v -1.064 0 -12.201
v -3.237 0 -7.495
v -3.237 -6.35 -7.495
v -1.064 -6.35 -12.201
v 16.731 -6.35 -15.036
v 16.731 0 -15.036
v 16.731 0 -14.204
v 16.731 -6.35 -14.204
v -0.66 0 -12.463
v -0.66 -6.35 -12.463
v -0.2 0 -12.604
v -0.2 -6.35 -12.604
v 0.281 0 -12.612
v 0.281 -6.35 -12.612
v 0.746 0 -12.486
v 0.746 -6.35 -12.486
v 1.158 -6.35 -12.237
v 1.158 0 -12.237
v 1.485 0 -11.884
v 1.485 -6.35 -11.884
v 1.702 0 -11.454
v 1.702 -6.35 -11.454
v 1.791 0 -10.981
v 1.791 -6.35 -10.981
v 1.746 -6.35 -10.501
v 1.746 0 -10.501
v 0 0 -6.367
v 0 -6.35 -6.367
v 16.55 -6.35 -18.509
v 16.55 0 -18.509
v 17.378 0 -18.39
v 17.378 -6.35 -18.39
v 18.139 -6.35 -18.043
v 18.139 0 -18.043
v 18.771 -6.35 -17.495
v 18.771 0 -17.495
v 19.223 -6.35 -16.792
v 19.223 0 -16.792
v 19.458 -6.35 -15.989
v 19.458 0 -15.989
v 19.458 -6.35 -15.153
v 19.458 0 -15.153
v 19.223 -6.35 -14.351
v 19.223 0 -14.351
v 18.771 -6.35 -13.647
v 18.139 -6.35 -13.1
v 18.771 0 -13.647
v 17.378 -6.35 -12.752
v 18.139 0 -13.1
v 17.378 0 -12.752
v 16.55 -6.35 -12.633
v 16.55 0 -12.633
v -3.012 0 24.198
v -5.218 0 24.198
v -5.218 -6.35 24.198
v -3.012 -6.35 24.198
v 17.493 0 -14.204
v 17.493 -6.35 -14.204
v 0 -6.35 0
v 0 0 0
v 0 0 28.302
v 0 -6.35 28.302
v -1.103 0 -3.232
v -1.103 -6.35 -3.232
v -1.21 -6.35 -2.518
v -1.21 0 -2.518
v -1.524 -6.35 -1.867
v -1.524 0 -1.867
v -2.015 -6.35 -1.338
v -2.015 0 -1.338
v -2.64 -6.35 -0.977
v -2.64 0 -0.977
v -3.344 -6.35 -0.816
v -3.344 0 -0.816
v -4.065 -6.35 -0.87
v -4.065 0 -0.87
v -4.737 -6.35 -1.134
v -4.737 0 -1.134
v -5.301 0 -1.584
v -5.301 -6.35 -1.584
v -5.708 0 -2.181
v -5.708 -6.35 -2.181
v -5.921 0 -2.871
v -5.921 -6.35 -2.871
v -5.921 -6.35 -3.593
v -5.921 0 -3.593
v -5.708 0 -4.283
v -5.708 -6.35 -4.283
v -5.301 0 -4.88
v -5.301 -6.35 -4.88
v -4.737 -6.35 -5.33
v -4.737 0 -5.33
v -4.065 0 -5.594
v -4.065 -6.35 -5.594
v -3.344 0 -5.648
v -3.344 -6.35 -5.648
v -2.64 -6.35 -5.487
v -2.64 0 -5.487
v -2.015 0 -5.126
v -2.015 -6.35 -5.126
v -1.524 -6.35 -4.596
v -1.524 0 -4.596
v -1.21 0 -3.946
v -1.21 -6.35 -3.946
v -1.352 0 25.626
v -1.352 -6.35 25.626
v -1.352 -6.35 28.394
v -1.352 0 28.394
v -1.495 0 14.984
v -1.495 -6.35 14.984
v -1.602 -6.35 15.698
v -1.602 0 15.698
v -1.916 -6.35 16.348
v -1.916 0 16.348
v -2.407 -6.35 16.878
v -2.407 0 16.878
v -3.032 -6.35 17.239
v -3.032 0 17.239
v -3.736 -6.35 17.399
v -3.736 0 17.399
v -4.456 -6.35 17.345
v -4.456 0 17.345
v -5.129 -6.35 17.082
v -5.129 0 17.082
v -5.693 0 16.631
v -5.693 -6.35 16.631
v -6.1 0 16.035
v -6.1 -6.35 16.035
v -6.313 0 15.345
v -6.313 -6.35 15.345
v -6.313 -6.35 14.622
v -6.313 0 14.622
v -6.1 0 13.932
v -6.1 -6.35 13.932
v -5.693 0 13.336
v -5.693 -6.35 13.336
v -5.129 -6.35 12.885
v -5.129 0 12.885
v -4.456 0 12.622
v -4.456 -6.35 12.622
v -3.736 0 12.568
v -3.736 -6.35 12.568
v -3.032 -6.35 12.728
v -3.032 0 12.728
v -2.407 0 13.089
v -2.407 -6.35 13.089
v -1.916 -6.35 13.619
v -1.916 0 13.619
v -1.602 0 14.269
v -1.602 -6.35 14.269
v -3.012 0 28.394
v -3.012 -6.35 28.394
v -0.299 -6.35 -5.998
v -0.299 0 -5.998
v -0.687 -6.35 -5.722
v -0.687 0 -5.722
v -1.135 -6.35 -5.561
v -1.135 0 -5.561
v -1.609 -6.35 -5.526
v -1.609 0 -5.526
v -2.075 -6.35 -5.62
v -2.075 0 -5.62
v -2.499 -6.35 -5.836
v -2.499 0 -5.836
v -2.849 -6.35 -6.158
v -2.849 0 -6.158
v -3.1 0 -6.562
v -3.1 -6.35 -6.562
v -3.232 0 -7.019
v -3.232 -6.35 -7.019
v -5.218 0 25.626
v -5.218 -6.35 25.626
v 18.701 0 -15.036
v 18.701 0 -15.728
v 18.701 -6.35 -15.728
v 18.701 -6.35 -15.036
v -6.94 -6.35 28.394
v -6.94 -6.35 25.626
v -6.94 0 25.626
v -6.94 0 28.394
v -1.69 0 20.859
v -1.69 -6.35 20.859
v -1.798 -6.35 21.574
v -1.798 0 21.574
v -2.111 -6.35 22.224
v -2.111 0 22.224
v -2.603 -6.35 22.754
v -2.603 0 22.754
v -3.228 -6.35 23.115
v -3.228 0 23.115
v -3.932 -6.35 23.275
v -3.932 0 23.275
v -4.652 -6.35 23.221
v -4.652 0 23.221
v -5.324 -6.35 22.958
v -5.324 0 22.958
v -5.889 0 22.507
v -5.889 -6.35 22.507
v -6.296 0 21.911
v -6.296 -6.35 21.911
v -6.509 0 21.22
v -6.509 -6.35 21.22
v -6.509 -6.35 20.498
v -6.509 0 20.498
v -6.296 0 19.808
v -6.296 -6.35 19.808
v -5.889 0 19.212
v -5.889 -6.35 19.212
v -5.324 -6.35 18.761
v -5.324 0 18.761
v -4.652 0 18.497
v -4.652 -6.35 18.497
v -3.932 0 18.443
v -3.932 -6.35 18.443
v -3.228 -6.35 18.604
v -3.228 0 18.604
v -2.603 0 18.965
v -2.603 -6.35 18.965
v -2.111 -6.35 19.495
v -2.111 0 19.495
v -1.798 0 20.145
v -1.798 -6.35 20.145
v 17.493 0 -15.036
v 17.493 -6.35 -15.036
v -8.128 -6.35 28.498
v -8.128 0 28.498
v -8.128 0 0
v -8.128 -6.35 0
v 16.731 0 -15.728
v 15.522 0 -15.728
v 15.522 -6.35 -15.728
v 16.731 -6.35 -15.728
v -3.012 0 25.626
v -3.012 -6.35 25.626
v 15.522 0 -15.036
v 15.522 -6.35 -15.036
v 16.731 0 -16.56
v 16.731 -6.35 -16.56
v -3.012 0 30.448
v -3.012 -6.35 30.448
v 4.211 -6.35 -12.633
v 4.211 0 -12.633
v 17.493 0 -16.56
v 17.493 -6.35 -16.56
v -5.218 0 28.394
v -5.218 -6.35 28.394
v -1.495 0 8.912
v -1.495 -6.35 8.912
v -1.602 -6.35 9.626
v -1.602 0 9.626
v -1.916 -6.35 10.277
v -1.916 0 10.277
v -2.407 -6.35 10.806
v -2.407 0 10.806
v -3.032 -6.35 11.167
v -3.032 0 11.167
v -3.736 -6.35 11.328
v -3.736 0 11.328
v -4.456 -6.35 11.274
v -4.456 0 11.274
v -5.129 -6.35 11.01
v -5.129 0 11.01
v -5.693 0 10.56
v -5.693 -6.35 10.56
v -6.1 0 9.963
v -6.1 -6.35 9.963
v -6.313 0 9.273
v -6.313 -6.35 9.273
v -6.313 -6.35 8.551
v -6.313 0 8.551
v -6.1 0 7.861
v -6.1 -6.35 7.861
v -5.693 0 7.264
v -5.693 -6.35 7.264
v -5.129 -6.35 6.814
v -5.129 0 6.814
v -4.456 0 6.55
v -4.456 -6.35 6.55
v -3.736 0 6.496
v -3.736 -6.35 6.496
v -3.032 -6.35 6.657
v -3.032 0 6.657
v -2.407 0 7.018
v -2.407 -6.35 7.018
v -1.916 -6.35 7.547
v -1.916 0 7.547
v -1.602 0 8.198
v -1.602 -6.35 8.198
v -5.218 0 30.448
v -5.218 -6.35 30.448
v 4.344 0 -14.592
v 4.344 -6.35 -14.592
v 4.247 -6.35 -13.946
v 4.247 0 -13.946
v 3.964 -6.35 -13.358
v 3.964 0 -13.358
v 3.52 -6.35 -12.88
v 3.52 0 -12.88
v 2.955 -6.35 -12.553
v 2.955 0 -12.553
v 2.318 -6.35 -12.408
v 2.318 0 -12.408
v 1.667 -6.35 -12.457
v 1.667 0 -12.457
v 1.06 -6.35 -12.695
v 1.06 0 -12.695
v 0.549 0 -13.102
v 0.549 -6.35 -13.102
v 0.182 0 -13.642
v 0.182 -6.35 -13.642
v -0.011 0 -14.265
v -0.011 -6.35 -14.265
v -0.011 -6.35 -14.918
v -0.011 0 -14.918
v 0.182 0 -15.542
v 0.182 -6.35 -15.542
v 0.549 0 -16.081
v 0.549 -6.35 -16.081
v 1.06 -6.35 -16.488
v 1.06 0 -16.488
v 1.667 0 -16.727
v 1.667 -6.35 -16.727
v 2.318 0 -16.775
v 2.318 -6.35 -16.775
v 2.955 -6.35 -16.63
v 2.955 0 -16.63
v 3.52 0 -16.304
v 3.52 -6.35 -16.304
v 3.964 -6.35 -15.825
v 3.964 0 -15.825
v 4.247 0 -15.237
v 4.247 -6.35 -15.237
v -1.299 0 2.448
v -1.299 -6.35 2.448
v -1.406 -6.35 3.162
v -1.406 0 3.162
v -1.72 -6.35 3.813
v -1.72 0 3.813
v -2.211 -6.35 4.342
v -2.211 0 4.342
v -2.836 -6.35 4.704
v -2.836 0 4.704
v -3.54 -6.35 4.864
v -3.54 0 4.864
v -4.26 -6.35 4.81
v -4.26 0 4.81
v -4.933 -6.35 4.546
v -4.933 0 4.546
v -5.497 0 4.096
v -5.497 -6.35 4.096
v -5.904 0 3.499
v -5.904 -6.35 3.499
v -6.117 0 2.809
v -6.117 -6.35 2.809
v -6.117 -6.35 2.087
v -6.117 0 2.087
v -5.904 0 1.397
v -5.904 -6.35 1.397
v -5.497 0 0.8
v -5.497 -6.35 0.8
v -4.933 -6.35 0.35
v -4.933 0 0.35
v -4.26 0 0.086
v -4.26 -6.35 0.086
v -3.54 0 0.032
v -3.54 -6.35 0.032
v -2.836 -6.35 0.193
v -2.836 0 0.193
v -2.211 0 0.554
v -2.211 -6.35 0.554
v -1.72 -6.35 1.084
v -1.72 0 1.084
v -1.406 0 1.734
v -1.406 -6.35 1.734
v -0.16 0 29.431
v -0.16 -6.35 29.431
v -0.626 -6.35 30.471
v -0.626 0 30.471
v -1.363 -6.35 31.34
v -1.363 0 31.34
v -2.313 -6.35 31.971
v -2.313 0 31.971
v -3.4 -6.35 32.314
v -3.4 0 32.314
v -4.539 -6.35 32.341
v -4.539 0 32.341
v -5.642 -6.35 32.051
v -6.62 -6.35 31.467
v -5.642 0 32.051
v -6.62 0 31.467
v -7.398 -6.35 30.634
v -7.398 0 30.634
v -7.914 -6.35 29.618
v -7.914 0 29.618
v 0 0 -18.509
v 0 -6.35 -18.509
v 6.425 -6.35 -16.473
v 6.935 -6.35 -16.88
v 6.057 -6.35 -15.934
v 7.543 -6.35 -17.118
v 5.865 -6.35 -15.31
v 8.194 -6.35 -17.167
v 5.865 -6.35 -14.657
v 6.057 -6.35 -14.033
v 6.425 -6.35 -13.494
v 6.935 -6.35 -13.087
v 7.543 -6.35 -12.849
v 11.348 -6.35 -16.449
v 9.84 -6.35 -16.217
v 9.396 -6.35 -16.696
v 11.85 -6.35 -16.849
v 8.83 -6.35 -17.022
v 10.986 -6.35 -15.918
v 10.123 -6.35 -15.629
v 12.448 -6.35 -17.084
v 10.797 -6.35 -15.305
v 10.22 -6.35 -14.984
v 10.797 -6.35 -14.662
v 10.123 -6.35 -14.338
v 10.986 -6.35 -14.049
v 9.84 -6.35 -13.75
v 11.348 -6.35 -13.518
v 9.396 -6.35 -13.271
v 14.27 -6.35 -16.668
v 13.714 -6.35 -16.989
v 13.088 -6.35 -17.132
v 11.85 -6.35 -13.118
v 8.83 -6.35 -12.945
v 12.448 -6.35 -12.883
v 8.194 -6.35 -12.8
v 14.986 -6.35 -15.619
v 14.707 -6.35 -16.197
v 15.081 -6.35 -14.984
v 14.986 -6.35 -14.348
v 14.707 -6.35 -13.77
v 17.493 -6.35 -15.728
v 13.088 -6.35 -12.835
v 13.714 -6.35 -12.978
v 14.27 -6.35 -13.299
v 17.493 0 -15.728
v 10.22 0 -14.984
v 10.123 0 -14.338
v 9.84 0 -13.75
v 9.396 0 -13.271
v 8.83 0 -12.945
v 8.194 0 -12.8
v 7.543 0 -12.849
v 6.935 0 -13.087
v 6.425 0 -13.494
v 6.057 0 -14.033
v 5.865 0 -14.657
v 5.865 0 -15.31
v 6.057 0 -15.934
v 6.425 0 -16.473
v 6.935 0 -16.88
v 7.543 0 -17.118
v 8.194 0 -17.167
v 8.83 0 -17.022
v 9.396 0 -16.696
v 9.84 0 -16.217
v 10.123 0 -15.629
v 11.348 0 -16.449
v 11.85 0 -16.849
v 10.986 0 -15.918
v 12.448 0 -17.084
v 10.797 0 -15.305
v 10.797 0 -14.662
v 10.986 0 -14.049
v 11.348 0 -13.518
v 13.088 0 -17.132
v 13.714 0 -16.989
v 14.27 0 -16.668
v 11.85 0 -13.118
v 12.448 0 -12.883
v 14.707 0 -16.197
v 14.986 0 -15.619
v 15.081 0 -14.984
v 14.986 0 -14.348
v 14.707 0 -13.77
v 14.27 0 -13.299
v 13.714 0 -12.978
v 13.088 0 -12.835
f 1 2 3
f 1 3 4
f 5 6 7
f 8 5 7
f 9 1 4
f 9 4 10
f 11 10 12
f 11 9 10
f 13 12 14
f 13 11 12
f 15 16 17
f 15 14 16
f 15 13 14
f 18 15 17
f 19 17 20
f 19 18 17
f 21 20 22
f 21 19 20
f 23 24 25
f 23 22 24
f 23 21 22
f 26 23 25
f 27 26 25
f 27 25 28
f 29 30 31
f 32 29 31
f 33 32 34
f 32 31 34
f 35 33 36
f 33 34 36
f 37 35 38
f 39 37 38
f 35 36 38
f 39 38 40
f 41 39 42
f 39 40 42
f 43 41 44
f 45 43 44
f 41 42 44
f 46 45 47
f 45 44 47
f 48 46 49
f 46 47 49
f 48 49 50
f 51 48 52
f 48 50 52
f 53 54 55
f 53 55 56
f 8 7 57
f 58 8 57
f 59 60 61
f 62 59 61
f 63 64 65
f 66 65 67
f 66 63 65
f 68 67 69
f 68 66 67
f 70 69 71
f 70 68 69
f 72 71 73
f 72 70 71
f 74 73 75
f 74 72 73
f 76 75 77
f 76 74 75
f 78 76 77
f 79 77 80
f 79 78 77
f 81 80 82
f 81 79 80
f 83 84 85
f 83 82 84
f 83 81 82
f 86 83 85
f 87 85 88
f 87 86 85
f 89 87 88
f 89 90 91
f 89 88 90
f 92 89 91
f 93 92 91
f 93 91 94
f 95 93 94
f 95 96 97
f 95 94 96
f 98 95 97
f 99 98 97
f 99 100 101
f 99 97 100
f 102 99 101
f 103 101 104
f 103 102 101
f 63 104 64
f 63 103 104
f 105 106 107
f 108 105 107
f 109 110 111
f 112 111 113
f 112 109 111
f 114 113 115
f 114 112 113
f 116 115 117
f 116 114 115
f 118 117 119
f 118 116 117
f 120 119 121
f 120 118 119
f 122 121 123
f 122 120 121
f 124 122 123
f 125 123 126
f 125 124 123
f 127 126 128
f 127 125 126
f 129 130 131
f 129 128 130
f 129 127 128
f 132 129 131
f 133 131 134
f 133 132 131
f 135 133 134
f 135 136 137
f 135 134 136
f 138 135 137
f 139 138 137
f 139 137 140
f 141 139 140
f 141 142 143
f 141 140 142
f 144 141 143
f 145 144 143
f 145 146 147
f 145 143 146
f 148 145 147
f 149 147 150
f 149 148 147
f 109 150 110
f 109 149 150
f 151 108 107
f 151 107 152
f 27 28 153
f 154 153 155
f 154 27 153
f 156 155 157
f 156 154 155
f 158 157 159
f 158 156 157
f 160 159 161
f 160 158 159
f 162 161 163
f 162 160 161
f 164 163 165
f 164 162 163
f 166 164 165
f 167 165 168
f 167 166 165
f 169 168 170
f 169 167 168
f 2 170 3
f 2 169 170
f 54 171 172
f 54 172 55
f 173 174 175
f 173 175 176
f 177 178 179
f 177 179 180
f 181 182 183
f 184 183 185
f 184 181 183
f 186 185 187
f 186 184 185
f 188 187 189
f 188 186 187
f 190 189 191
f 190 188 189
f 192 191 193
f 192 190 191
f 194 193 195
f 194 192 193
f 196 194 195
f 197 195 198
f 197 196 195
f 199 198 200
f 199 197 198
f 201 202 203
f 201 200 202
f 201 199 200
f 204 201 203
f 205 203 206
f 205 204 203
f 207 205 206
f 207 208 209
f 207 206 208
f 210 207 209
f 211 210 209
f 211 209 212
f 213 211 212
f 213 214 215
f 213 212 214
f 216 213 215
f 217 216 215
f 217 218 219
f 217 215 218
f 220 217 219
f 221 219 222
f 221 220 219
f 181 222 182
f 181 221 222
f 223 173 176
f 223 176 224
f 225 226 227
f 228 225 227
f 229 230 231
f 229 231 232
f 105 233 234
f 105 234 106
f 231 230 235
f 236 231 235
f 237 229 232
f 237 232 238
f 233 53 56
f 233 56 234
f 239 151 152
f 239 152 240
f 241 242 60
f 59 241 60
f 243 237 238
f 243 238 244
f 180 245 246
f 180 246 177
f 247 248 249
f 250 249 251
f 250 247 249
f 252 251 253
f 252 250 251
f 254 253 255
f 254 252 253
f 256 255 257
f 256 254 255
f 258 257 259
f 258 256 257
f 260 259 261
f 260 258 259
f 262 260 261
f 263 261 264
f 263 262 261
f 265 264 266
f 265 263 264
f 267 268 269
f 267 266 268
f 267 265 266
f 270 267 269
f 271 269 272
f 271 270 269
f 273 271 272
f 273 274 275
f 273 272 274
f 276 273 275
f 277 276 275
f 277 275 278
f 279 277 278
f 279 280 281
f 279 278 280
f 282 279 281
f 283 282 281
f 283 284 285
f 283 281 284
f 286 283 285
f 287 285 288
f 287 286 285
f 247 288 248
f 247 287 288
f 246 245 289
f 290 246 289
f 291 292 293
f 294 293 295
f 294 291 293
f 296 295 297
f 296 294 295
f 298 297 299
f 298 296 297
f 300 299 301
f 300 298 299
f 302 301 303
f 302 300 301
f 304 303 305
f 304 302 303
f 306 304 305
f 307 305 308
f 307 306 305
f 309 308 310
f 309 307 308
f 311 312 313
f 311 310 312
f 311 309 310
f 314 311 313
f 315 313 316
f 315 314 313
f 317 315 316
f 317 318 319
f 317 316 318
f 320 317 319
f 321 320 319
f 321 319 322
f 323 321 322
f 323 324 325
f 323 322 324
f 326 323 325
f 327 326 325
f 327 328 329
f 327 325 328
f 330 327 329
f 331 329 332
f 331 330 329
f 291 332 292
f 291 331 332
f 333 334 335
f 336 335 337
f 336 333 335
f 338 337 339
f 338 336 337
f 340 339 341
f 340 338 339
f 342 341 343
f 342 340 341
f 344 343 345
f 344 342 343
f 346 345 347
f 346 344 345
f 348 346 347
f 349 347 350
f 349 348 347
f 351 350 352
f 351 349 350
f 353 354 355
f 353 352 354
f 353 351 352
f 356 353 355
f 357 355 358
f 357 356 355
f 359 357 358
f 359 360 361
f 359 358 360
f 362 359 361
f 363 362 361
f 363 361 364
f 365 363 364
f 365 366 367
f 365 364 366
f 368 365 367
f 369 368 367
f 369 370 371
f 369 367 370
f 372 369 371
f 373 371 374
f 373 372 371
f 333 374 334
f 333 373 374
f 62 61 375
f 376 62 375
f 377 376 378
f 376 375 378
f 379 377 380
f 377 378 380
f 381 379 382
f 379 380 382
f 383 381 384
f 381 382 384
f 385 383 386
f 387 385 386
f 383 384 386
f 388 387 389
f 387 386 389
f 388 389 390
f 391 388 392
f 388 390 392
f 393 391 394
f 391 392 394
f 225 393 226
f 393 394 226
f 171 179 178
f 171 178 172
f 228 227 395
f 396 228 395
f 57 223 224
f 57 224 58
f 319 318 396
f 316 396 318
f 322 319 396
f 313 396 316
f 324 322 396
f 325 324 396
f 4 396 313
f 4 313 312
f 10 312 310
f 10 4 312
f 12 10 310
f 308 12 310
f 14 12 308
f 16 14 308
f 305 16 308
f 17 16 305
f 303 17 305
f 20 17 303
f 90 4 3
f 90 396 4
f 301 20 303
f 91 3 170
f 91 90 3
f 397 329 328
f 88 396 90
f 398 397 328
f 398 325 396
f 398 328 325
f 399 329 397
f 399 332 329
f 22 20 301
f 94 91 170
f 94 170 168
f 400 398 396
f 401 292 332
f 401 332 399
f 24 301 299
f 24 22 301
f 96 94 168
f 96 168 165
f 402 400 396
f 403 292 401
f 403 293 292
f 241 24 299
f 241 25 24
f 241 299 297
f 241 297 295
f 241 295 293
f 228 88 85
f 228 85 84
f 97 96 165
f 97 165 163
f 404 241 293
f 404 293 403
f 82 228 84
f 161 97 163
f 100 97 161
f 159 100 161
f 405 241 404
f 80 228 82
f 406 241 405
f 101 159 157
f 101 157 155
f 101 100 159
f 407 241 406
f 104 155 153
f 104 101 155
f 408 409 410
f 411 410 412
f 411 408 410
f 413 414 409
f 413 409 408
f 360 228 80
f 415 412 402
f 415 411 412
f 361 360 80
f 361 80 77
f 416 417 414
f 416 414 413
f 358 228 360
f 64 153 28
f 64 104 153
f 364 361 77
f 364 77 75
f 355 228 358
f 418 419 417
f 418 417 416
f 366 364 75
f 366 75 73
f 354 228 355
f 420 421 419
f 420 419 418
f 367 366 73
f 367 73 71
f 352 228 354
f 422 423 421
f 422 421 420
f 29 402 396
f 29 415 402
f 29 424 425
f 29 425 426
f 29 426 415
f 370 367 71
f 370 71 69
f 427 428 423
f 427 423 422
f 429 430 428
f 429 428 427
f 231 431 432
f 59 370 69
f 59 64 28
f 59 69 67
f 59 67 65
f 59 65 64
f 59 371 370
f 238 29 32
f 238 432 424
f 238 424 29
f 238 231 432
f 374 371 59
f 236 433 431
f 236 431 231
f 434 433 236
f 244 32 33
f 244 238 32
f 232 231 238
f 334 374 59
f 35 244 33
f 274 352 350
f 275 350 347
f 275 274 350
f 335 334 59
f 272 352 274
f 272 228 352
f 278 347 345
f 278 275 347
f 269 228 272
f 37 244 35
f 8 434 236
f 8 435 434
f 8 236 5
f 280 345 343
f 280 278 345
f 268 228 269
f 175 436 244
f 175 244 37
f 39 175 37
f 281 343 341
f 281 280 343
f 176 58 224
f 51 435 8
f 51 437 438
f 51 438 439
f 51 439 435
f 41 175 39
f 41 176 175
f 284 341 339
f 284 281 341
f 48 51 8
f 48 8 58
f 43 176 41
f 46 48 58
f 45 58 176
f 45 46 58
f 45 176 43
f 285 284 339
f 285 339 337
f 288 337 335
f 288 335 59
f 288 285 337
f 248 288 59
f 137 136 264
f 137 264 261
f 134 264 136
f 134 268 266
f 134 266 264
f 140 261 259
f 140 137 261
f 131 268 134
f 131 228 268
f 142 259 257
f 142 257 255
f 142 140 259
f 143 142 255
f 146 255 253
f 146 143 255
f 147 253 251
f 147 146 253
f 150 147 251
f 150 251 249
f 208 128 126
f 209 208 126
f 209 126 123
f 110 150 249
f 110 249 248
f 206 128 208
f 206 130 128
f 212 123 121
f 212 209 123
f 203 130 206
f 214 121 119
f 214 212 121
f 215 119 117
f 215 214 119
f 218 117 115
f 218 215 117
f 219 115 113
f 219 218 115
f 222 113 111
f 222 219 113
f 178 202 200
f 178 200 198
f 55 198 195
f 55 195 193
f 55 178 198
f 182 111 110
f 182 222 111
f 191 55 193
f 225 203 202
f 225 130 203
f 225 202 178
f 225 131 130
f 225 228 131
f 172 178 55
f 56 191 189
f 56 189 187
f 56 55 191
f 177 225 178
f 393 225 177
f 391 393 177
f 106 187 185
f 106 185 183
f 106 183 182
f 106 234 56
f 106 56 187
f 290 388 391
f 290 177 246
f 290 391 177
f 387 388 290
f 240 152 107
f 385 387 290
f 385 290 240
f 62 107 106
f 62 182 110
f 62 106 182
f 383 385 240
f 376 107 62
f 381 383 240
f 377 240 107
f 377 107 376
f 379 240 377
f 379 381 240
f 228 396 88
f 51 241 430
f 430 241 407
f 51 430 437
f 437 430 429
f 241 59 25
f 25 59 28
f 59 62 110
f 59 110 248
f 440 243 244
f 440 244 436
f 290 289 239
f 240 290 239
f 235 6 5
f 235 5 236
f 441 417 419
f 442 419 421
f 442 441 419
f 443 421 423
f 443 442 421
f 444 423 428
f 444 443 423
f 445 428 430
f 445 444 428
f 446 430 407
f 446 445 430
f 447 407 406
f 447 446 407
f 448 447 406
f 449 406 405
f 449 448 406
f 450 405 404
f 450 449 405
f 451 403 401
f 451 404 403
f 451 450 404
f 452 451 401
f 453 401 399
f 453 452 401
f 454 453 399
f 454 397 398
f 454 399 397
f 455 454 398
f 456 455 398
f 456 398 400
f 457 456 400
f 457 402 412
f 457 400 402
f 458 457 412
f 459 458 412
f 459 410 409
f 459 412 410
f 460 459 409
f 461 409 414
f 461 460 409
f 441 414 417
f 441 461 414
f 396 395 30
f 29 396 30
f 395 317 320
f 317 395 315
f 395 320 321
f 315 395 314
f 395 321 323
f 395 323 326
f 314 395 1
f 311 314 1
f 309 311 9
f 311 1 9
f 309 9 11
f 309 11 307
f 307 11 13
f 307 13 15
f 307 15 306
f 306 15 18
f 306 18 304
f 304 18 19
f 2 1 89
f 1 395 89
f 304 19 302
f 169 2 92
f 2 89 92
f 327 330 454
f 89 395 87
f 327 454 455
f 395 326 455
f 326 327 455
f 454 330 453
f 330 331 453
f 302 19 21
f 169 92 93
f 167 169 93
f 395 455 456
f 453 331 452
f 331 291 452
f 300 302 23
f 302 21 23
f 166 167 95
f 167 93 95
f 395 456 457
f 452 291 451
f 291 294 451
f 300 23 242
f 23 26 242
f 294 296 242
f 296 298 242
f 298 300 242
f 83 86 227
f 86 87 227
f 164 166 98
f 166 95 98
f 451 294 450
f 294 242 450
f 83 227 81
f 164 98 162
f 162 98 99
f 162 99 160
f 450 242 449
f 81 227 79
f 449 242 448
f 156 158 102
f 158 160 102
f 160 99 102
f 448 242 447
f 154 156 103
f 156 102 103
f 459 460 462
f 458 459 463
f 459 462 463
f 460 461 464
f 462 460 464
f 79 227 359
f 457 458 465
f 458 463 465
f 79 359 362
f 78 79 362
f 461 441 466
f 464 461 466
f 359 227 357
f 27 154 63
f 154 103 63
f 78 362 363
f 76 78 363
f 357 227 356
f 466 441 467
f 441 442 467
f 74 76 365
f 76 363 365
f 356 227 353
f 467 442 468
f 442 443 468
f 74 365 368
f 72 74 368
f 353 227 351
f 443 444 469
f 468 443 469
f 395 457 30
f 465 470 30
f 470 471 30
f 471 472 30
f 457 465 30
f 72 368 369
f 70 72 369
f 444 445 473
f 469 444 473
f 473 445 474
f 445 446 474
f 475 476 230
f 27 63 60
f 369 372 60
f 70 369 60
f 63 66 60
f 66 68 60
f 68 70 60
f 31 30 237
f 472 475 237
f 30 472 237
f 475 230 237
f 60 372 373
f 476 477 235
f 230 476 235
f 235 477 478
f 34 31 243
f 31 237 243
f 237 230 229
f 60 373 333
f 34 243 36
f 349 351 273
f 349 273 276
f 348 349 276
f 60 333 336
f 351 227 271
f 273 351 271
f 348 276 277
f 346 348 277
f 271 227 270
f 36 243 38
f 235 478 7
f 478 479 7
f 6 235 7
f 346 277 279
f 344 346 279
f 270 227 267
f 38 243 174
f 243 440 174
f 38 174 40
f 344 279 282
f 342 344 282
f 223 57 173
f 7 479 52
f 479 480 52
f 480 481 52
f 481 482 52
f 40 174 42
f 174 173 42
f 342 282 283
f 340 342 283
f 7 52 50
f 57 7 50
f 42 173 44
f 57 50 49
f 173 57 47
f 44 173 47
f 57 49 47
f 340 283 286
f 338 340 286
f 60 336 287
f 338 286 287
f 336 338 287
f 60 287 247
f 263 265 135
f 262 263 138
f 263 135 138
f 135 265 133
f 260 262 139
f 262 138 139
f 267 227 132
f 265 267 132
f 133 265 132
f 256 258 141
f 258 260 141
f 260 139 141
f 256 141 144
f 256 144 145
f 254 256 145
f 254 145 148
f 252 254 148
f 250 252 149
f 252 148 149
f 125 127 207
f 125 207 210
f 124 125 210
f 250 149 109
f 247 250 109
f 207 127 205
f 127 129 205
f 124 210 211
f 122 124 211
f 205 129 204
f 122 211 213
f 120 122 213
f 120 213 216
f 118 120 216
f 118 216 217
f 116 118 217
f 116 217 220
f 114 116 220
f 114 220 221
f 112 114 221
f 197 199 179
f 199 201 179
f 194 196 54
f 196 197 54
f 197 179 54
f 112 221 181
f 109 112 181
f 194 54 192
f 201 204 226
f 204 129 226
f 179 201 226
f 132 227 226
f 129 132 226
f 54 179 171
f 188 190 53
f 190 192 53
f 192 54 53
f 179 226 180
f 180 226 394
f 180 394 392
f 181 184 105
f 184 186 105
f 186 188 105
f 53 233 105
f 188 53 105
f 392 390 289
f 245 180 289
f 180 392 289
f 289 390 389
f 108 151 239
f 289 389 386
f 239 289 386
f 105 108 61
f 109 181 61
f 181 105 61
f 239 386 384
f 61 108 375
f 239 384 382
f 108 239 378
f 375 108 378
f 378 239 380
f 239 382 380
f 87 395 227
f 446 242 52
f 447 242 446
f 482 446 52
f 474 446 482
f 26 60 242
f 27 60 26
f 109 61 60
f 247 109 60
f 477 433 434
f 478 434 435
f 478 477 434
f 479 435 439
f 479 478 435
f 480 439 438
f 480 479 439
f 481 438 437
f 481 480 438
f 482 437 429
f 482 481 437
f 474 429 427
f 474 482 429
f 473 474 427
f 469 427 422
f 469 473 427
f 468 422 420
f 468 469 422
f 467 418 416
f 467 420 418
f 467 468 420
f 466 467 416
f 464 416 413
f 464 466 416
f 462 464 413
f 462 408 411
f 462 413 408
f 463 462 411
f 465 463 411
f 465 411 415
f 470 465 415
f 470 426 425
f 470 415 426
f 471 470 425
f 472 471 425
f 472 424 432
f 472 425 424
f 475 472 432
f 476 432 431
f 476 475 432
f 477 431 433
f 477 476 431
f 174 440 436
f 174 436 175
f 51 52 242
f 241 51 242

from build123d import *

# Parameters (mm, degrees)
F1_DEPTH = 6.35
F2_W     = 2.2056519679
F2_H     = 1.4280619276
F2_H_2   = 2.76814439
F2_W_2   = 1.6606743359
F2_W_3   = 1.7216736962
F2_H_3   = 2.0531332773
F3_DEPTH = 25.4
F4_R     = 2.4226901475
F4_R_2   = 2.1898139235
F4_R_3   = 2.1544927731
F5_DEPTH = 25.4
F7_DEPTH = 25.4
F8_W     = 0.762
F8_H     = 0.8323322826
F8_H_2   = 0.6916765124
F8_W_2   = 1.2084901007
F9_DEPTH = 25.4


with BuildPart() as f1:
    # F0 (on Front) → F1 (new body)
    with BuildSketch(Plane.XZ):
        with BuildLine():
            Line((-8.1283105537, 28.4980535507), (-8.1283105537, 0))
            Line((-8.1283105537, 0), (0, -18.5090452433))
            Line((0, -18.5090452433), (0, 0))
            Line((0, 0), (0, 28.302192688))
            ThreePointArc((0, 28.302192688), (-3.9685561641, 32.3675276661), (-8.1283105537, 28.4980535507))
        make_face()
        with BuildLine():
            Line((0, 0), (0, -18.5090452433))
            Line((0, -18.5090452433), (16.5504161268, -18.5090452433))
            ThreePointArc((16.5504161268, -18.5090452433), (19.4883598015, -15.5711015686), (16.5504161268, -12.633157894))
            Line((16.5504161268, -12.633157894), (4.2110523209, -12.633157894))
            Line((4.2110523209, -12.633157894), (0, 0))
        make_face()
    extrude(amount=F1_DEPTH)

    # F2 (on Front) → F3 (cut)
    with BuildSketch(Plane.XZ):
        with Locations((-4.1150925963, 24.9122383648)):
            Rectangle(F2_W, F2_H)
        with Locations((-4.1150925963, 27.0103415236)):
            Rectangle(F2_W, F2_H_2)
        with Locations((-2.1819294444, 27.0103415236)):
            Rectangle(F2_W_2, F2_H_2)
        with Locations((-6.0787554284, 27.0103415236)):
            Rectangle(F2_W_3, F2_H_2)
        with Locations((-4.1150925963, 29.4209803573)):
            Rectangle(F2_W, F2_H_3)
    extrude(amount=F3_DEPTH, mode=Mode.SUBTRACT)

    # F4 (on Front) → F5 (cut)
    with BuildSketch(Plane.XZ):
        with Locations((-4.1131214239, 20.8593998104)):
            Circle(F4_R)
        with Locations((-3.9172577672, 14.9835133925)):
            Circle(F4_R)
        with Locations((-3.9172577672, 8.9117623866)):
            Circle(F4_R)
        with Locations((-3.7213957403, 2.4482863955)):
            Circle(F4_R)
        with Locations((-3.5255320836, -3.2317379955)):
            Circle(F4_R)
        with Locations((2.154491609, -14.5917870104)):
            Circle(F4_R_2)
        with Locations((8.030379191, -14.9835133925)):
            Circle(F4_R_2)
        with Locations((12.9269538447, -14.9835133925)):
            Circle(F4_R_3)
    extrude(amount=F5_DEPTH, mode=Mode.SUBTRACT)

    # F6 (on Front) → F7 (cut)
    with BuildSketch(Plane.XZ):
        with BuildLine():
            ThreePointArc((0, -6.3673276454), (-2.0752432977, -5.6200849272), (-3.2373126596, -7.4948119))
            Line((-3.2373126596, -7.4948119), (-1.0640458204, -12.2008332983))
            ThreePointArc((-1.0640458204, -12.2008332983), (0.9608741924, -12.3759405779), (1.7464946723, -10.5014368892))
            Line((1.7464946723, -10.5014368892), (0, -6.3673276454))
        make_face()
    extrude(amount=F7_DEPTH, mode=Mode.SUBTRACT)

    # F8 (on Front) → F9 (cut)
    with BuildSketch(Plane.XZ):
        with Locations((17.1117875725, -16.1442225721)):
            Rectangle(F8_W, F8_H)
        with Locations((17.1117875725, -15.3822181746)):
            Rectangle(F8_W, F8_H_2)
        with Locations((18.0970326229, -15.3822181746)):
            Rectangle(F8_W_2, F8_H_2)
        with Locations((16.1265425221, -15.3822181746)):
            Rectangle(F8_W_2, F8_H_2)
        with Locations((17.1117875725, -14.6202137772)):
            Rectangle(F8_W, F8_H)
    extrude(amount=F9_DEPTH, mode=Mode.SUBTRACT)


solid = f1.part
